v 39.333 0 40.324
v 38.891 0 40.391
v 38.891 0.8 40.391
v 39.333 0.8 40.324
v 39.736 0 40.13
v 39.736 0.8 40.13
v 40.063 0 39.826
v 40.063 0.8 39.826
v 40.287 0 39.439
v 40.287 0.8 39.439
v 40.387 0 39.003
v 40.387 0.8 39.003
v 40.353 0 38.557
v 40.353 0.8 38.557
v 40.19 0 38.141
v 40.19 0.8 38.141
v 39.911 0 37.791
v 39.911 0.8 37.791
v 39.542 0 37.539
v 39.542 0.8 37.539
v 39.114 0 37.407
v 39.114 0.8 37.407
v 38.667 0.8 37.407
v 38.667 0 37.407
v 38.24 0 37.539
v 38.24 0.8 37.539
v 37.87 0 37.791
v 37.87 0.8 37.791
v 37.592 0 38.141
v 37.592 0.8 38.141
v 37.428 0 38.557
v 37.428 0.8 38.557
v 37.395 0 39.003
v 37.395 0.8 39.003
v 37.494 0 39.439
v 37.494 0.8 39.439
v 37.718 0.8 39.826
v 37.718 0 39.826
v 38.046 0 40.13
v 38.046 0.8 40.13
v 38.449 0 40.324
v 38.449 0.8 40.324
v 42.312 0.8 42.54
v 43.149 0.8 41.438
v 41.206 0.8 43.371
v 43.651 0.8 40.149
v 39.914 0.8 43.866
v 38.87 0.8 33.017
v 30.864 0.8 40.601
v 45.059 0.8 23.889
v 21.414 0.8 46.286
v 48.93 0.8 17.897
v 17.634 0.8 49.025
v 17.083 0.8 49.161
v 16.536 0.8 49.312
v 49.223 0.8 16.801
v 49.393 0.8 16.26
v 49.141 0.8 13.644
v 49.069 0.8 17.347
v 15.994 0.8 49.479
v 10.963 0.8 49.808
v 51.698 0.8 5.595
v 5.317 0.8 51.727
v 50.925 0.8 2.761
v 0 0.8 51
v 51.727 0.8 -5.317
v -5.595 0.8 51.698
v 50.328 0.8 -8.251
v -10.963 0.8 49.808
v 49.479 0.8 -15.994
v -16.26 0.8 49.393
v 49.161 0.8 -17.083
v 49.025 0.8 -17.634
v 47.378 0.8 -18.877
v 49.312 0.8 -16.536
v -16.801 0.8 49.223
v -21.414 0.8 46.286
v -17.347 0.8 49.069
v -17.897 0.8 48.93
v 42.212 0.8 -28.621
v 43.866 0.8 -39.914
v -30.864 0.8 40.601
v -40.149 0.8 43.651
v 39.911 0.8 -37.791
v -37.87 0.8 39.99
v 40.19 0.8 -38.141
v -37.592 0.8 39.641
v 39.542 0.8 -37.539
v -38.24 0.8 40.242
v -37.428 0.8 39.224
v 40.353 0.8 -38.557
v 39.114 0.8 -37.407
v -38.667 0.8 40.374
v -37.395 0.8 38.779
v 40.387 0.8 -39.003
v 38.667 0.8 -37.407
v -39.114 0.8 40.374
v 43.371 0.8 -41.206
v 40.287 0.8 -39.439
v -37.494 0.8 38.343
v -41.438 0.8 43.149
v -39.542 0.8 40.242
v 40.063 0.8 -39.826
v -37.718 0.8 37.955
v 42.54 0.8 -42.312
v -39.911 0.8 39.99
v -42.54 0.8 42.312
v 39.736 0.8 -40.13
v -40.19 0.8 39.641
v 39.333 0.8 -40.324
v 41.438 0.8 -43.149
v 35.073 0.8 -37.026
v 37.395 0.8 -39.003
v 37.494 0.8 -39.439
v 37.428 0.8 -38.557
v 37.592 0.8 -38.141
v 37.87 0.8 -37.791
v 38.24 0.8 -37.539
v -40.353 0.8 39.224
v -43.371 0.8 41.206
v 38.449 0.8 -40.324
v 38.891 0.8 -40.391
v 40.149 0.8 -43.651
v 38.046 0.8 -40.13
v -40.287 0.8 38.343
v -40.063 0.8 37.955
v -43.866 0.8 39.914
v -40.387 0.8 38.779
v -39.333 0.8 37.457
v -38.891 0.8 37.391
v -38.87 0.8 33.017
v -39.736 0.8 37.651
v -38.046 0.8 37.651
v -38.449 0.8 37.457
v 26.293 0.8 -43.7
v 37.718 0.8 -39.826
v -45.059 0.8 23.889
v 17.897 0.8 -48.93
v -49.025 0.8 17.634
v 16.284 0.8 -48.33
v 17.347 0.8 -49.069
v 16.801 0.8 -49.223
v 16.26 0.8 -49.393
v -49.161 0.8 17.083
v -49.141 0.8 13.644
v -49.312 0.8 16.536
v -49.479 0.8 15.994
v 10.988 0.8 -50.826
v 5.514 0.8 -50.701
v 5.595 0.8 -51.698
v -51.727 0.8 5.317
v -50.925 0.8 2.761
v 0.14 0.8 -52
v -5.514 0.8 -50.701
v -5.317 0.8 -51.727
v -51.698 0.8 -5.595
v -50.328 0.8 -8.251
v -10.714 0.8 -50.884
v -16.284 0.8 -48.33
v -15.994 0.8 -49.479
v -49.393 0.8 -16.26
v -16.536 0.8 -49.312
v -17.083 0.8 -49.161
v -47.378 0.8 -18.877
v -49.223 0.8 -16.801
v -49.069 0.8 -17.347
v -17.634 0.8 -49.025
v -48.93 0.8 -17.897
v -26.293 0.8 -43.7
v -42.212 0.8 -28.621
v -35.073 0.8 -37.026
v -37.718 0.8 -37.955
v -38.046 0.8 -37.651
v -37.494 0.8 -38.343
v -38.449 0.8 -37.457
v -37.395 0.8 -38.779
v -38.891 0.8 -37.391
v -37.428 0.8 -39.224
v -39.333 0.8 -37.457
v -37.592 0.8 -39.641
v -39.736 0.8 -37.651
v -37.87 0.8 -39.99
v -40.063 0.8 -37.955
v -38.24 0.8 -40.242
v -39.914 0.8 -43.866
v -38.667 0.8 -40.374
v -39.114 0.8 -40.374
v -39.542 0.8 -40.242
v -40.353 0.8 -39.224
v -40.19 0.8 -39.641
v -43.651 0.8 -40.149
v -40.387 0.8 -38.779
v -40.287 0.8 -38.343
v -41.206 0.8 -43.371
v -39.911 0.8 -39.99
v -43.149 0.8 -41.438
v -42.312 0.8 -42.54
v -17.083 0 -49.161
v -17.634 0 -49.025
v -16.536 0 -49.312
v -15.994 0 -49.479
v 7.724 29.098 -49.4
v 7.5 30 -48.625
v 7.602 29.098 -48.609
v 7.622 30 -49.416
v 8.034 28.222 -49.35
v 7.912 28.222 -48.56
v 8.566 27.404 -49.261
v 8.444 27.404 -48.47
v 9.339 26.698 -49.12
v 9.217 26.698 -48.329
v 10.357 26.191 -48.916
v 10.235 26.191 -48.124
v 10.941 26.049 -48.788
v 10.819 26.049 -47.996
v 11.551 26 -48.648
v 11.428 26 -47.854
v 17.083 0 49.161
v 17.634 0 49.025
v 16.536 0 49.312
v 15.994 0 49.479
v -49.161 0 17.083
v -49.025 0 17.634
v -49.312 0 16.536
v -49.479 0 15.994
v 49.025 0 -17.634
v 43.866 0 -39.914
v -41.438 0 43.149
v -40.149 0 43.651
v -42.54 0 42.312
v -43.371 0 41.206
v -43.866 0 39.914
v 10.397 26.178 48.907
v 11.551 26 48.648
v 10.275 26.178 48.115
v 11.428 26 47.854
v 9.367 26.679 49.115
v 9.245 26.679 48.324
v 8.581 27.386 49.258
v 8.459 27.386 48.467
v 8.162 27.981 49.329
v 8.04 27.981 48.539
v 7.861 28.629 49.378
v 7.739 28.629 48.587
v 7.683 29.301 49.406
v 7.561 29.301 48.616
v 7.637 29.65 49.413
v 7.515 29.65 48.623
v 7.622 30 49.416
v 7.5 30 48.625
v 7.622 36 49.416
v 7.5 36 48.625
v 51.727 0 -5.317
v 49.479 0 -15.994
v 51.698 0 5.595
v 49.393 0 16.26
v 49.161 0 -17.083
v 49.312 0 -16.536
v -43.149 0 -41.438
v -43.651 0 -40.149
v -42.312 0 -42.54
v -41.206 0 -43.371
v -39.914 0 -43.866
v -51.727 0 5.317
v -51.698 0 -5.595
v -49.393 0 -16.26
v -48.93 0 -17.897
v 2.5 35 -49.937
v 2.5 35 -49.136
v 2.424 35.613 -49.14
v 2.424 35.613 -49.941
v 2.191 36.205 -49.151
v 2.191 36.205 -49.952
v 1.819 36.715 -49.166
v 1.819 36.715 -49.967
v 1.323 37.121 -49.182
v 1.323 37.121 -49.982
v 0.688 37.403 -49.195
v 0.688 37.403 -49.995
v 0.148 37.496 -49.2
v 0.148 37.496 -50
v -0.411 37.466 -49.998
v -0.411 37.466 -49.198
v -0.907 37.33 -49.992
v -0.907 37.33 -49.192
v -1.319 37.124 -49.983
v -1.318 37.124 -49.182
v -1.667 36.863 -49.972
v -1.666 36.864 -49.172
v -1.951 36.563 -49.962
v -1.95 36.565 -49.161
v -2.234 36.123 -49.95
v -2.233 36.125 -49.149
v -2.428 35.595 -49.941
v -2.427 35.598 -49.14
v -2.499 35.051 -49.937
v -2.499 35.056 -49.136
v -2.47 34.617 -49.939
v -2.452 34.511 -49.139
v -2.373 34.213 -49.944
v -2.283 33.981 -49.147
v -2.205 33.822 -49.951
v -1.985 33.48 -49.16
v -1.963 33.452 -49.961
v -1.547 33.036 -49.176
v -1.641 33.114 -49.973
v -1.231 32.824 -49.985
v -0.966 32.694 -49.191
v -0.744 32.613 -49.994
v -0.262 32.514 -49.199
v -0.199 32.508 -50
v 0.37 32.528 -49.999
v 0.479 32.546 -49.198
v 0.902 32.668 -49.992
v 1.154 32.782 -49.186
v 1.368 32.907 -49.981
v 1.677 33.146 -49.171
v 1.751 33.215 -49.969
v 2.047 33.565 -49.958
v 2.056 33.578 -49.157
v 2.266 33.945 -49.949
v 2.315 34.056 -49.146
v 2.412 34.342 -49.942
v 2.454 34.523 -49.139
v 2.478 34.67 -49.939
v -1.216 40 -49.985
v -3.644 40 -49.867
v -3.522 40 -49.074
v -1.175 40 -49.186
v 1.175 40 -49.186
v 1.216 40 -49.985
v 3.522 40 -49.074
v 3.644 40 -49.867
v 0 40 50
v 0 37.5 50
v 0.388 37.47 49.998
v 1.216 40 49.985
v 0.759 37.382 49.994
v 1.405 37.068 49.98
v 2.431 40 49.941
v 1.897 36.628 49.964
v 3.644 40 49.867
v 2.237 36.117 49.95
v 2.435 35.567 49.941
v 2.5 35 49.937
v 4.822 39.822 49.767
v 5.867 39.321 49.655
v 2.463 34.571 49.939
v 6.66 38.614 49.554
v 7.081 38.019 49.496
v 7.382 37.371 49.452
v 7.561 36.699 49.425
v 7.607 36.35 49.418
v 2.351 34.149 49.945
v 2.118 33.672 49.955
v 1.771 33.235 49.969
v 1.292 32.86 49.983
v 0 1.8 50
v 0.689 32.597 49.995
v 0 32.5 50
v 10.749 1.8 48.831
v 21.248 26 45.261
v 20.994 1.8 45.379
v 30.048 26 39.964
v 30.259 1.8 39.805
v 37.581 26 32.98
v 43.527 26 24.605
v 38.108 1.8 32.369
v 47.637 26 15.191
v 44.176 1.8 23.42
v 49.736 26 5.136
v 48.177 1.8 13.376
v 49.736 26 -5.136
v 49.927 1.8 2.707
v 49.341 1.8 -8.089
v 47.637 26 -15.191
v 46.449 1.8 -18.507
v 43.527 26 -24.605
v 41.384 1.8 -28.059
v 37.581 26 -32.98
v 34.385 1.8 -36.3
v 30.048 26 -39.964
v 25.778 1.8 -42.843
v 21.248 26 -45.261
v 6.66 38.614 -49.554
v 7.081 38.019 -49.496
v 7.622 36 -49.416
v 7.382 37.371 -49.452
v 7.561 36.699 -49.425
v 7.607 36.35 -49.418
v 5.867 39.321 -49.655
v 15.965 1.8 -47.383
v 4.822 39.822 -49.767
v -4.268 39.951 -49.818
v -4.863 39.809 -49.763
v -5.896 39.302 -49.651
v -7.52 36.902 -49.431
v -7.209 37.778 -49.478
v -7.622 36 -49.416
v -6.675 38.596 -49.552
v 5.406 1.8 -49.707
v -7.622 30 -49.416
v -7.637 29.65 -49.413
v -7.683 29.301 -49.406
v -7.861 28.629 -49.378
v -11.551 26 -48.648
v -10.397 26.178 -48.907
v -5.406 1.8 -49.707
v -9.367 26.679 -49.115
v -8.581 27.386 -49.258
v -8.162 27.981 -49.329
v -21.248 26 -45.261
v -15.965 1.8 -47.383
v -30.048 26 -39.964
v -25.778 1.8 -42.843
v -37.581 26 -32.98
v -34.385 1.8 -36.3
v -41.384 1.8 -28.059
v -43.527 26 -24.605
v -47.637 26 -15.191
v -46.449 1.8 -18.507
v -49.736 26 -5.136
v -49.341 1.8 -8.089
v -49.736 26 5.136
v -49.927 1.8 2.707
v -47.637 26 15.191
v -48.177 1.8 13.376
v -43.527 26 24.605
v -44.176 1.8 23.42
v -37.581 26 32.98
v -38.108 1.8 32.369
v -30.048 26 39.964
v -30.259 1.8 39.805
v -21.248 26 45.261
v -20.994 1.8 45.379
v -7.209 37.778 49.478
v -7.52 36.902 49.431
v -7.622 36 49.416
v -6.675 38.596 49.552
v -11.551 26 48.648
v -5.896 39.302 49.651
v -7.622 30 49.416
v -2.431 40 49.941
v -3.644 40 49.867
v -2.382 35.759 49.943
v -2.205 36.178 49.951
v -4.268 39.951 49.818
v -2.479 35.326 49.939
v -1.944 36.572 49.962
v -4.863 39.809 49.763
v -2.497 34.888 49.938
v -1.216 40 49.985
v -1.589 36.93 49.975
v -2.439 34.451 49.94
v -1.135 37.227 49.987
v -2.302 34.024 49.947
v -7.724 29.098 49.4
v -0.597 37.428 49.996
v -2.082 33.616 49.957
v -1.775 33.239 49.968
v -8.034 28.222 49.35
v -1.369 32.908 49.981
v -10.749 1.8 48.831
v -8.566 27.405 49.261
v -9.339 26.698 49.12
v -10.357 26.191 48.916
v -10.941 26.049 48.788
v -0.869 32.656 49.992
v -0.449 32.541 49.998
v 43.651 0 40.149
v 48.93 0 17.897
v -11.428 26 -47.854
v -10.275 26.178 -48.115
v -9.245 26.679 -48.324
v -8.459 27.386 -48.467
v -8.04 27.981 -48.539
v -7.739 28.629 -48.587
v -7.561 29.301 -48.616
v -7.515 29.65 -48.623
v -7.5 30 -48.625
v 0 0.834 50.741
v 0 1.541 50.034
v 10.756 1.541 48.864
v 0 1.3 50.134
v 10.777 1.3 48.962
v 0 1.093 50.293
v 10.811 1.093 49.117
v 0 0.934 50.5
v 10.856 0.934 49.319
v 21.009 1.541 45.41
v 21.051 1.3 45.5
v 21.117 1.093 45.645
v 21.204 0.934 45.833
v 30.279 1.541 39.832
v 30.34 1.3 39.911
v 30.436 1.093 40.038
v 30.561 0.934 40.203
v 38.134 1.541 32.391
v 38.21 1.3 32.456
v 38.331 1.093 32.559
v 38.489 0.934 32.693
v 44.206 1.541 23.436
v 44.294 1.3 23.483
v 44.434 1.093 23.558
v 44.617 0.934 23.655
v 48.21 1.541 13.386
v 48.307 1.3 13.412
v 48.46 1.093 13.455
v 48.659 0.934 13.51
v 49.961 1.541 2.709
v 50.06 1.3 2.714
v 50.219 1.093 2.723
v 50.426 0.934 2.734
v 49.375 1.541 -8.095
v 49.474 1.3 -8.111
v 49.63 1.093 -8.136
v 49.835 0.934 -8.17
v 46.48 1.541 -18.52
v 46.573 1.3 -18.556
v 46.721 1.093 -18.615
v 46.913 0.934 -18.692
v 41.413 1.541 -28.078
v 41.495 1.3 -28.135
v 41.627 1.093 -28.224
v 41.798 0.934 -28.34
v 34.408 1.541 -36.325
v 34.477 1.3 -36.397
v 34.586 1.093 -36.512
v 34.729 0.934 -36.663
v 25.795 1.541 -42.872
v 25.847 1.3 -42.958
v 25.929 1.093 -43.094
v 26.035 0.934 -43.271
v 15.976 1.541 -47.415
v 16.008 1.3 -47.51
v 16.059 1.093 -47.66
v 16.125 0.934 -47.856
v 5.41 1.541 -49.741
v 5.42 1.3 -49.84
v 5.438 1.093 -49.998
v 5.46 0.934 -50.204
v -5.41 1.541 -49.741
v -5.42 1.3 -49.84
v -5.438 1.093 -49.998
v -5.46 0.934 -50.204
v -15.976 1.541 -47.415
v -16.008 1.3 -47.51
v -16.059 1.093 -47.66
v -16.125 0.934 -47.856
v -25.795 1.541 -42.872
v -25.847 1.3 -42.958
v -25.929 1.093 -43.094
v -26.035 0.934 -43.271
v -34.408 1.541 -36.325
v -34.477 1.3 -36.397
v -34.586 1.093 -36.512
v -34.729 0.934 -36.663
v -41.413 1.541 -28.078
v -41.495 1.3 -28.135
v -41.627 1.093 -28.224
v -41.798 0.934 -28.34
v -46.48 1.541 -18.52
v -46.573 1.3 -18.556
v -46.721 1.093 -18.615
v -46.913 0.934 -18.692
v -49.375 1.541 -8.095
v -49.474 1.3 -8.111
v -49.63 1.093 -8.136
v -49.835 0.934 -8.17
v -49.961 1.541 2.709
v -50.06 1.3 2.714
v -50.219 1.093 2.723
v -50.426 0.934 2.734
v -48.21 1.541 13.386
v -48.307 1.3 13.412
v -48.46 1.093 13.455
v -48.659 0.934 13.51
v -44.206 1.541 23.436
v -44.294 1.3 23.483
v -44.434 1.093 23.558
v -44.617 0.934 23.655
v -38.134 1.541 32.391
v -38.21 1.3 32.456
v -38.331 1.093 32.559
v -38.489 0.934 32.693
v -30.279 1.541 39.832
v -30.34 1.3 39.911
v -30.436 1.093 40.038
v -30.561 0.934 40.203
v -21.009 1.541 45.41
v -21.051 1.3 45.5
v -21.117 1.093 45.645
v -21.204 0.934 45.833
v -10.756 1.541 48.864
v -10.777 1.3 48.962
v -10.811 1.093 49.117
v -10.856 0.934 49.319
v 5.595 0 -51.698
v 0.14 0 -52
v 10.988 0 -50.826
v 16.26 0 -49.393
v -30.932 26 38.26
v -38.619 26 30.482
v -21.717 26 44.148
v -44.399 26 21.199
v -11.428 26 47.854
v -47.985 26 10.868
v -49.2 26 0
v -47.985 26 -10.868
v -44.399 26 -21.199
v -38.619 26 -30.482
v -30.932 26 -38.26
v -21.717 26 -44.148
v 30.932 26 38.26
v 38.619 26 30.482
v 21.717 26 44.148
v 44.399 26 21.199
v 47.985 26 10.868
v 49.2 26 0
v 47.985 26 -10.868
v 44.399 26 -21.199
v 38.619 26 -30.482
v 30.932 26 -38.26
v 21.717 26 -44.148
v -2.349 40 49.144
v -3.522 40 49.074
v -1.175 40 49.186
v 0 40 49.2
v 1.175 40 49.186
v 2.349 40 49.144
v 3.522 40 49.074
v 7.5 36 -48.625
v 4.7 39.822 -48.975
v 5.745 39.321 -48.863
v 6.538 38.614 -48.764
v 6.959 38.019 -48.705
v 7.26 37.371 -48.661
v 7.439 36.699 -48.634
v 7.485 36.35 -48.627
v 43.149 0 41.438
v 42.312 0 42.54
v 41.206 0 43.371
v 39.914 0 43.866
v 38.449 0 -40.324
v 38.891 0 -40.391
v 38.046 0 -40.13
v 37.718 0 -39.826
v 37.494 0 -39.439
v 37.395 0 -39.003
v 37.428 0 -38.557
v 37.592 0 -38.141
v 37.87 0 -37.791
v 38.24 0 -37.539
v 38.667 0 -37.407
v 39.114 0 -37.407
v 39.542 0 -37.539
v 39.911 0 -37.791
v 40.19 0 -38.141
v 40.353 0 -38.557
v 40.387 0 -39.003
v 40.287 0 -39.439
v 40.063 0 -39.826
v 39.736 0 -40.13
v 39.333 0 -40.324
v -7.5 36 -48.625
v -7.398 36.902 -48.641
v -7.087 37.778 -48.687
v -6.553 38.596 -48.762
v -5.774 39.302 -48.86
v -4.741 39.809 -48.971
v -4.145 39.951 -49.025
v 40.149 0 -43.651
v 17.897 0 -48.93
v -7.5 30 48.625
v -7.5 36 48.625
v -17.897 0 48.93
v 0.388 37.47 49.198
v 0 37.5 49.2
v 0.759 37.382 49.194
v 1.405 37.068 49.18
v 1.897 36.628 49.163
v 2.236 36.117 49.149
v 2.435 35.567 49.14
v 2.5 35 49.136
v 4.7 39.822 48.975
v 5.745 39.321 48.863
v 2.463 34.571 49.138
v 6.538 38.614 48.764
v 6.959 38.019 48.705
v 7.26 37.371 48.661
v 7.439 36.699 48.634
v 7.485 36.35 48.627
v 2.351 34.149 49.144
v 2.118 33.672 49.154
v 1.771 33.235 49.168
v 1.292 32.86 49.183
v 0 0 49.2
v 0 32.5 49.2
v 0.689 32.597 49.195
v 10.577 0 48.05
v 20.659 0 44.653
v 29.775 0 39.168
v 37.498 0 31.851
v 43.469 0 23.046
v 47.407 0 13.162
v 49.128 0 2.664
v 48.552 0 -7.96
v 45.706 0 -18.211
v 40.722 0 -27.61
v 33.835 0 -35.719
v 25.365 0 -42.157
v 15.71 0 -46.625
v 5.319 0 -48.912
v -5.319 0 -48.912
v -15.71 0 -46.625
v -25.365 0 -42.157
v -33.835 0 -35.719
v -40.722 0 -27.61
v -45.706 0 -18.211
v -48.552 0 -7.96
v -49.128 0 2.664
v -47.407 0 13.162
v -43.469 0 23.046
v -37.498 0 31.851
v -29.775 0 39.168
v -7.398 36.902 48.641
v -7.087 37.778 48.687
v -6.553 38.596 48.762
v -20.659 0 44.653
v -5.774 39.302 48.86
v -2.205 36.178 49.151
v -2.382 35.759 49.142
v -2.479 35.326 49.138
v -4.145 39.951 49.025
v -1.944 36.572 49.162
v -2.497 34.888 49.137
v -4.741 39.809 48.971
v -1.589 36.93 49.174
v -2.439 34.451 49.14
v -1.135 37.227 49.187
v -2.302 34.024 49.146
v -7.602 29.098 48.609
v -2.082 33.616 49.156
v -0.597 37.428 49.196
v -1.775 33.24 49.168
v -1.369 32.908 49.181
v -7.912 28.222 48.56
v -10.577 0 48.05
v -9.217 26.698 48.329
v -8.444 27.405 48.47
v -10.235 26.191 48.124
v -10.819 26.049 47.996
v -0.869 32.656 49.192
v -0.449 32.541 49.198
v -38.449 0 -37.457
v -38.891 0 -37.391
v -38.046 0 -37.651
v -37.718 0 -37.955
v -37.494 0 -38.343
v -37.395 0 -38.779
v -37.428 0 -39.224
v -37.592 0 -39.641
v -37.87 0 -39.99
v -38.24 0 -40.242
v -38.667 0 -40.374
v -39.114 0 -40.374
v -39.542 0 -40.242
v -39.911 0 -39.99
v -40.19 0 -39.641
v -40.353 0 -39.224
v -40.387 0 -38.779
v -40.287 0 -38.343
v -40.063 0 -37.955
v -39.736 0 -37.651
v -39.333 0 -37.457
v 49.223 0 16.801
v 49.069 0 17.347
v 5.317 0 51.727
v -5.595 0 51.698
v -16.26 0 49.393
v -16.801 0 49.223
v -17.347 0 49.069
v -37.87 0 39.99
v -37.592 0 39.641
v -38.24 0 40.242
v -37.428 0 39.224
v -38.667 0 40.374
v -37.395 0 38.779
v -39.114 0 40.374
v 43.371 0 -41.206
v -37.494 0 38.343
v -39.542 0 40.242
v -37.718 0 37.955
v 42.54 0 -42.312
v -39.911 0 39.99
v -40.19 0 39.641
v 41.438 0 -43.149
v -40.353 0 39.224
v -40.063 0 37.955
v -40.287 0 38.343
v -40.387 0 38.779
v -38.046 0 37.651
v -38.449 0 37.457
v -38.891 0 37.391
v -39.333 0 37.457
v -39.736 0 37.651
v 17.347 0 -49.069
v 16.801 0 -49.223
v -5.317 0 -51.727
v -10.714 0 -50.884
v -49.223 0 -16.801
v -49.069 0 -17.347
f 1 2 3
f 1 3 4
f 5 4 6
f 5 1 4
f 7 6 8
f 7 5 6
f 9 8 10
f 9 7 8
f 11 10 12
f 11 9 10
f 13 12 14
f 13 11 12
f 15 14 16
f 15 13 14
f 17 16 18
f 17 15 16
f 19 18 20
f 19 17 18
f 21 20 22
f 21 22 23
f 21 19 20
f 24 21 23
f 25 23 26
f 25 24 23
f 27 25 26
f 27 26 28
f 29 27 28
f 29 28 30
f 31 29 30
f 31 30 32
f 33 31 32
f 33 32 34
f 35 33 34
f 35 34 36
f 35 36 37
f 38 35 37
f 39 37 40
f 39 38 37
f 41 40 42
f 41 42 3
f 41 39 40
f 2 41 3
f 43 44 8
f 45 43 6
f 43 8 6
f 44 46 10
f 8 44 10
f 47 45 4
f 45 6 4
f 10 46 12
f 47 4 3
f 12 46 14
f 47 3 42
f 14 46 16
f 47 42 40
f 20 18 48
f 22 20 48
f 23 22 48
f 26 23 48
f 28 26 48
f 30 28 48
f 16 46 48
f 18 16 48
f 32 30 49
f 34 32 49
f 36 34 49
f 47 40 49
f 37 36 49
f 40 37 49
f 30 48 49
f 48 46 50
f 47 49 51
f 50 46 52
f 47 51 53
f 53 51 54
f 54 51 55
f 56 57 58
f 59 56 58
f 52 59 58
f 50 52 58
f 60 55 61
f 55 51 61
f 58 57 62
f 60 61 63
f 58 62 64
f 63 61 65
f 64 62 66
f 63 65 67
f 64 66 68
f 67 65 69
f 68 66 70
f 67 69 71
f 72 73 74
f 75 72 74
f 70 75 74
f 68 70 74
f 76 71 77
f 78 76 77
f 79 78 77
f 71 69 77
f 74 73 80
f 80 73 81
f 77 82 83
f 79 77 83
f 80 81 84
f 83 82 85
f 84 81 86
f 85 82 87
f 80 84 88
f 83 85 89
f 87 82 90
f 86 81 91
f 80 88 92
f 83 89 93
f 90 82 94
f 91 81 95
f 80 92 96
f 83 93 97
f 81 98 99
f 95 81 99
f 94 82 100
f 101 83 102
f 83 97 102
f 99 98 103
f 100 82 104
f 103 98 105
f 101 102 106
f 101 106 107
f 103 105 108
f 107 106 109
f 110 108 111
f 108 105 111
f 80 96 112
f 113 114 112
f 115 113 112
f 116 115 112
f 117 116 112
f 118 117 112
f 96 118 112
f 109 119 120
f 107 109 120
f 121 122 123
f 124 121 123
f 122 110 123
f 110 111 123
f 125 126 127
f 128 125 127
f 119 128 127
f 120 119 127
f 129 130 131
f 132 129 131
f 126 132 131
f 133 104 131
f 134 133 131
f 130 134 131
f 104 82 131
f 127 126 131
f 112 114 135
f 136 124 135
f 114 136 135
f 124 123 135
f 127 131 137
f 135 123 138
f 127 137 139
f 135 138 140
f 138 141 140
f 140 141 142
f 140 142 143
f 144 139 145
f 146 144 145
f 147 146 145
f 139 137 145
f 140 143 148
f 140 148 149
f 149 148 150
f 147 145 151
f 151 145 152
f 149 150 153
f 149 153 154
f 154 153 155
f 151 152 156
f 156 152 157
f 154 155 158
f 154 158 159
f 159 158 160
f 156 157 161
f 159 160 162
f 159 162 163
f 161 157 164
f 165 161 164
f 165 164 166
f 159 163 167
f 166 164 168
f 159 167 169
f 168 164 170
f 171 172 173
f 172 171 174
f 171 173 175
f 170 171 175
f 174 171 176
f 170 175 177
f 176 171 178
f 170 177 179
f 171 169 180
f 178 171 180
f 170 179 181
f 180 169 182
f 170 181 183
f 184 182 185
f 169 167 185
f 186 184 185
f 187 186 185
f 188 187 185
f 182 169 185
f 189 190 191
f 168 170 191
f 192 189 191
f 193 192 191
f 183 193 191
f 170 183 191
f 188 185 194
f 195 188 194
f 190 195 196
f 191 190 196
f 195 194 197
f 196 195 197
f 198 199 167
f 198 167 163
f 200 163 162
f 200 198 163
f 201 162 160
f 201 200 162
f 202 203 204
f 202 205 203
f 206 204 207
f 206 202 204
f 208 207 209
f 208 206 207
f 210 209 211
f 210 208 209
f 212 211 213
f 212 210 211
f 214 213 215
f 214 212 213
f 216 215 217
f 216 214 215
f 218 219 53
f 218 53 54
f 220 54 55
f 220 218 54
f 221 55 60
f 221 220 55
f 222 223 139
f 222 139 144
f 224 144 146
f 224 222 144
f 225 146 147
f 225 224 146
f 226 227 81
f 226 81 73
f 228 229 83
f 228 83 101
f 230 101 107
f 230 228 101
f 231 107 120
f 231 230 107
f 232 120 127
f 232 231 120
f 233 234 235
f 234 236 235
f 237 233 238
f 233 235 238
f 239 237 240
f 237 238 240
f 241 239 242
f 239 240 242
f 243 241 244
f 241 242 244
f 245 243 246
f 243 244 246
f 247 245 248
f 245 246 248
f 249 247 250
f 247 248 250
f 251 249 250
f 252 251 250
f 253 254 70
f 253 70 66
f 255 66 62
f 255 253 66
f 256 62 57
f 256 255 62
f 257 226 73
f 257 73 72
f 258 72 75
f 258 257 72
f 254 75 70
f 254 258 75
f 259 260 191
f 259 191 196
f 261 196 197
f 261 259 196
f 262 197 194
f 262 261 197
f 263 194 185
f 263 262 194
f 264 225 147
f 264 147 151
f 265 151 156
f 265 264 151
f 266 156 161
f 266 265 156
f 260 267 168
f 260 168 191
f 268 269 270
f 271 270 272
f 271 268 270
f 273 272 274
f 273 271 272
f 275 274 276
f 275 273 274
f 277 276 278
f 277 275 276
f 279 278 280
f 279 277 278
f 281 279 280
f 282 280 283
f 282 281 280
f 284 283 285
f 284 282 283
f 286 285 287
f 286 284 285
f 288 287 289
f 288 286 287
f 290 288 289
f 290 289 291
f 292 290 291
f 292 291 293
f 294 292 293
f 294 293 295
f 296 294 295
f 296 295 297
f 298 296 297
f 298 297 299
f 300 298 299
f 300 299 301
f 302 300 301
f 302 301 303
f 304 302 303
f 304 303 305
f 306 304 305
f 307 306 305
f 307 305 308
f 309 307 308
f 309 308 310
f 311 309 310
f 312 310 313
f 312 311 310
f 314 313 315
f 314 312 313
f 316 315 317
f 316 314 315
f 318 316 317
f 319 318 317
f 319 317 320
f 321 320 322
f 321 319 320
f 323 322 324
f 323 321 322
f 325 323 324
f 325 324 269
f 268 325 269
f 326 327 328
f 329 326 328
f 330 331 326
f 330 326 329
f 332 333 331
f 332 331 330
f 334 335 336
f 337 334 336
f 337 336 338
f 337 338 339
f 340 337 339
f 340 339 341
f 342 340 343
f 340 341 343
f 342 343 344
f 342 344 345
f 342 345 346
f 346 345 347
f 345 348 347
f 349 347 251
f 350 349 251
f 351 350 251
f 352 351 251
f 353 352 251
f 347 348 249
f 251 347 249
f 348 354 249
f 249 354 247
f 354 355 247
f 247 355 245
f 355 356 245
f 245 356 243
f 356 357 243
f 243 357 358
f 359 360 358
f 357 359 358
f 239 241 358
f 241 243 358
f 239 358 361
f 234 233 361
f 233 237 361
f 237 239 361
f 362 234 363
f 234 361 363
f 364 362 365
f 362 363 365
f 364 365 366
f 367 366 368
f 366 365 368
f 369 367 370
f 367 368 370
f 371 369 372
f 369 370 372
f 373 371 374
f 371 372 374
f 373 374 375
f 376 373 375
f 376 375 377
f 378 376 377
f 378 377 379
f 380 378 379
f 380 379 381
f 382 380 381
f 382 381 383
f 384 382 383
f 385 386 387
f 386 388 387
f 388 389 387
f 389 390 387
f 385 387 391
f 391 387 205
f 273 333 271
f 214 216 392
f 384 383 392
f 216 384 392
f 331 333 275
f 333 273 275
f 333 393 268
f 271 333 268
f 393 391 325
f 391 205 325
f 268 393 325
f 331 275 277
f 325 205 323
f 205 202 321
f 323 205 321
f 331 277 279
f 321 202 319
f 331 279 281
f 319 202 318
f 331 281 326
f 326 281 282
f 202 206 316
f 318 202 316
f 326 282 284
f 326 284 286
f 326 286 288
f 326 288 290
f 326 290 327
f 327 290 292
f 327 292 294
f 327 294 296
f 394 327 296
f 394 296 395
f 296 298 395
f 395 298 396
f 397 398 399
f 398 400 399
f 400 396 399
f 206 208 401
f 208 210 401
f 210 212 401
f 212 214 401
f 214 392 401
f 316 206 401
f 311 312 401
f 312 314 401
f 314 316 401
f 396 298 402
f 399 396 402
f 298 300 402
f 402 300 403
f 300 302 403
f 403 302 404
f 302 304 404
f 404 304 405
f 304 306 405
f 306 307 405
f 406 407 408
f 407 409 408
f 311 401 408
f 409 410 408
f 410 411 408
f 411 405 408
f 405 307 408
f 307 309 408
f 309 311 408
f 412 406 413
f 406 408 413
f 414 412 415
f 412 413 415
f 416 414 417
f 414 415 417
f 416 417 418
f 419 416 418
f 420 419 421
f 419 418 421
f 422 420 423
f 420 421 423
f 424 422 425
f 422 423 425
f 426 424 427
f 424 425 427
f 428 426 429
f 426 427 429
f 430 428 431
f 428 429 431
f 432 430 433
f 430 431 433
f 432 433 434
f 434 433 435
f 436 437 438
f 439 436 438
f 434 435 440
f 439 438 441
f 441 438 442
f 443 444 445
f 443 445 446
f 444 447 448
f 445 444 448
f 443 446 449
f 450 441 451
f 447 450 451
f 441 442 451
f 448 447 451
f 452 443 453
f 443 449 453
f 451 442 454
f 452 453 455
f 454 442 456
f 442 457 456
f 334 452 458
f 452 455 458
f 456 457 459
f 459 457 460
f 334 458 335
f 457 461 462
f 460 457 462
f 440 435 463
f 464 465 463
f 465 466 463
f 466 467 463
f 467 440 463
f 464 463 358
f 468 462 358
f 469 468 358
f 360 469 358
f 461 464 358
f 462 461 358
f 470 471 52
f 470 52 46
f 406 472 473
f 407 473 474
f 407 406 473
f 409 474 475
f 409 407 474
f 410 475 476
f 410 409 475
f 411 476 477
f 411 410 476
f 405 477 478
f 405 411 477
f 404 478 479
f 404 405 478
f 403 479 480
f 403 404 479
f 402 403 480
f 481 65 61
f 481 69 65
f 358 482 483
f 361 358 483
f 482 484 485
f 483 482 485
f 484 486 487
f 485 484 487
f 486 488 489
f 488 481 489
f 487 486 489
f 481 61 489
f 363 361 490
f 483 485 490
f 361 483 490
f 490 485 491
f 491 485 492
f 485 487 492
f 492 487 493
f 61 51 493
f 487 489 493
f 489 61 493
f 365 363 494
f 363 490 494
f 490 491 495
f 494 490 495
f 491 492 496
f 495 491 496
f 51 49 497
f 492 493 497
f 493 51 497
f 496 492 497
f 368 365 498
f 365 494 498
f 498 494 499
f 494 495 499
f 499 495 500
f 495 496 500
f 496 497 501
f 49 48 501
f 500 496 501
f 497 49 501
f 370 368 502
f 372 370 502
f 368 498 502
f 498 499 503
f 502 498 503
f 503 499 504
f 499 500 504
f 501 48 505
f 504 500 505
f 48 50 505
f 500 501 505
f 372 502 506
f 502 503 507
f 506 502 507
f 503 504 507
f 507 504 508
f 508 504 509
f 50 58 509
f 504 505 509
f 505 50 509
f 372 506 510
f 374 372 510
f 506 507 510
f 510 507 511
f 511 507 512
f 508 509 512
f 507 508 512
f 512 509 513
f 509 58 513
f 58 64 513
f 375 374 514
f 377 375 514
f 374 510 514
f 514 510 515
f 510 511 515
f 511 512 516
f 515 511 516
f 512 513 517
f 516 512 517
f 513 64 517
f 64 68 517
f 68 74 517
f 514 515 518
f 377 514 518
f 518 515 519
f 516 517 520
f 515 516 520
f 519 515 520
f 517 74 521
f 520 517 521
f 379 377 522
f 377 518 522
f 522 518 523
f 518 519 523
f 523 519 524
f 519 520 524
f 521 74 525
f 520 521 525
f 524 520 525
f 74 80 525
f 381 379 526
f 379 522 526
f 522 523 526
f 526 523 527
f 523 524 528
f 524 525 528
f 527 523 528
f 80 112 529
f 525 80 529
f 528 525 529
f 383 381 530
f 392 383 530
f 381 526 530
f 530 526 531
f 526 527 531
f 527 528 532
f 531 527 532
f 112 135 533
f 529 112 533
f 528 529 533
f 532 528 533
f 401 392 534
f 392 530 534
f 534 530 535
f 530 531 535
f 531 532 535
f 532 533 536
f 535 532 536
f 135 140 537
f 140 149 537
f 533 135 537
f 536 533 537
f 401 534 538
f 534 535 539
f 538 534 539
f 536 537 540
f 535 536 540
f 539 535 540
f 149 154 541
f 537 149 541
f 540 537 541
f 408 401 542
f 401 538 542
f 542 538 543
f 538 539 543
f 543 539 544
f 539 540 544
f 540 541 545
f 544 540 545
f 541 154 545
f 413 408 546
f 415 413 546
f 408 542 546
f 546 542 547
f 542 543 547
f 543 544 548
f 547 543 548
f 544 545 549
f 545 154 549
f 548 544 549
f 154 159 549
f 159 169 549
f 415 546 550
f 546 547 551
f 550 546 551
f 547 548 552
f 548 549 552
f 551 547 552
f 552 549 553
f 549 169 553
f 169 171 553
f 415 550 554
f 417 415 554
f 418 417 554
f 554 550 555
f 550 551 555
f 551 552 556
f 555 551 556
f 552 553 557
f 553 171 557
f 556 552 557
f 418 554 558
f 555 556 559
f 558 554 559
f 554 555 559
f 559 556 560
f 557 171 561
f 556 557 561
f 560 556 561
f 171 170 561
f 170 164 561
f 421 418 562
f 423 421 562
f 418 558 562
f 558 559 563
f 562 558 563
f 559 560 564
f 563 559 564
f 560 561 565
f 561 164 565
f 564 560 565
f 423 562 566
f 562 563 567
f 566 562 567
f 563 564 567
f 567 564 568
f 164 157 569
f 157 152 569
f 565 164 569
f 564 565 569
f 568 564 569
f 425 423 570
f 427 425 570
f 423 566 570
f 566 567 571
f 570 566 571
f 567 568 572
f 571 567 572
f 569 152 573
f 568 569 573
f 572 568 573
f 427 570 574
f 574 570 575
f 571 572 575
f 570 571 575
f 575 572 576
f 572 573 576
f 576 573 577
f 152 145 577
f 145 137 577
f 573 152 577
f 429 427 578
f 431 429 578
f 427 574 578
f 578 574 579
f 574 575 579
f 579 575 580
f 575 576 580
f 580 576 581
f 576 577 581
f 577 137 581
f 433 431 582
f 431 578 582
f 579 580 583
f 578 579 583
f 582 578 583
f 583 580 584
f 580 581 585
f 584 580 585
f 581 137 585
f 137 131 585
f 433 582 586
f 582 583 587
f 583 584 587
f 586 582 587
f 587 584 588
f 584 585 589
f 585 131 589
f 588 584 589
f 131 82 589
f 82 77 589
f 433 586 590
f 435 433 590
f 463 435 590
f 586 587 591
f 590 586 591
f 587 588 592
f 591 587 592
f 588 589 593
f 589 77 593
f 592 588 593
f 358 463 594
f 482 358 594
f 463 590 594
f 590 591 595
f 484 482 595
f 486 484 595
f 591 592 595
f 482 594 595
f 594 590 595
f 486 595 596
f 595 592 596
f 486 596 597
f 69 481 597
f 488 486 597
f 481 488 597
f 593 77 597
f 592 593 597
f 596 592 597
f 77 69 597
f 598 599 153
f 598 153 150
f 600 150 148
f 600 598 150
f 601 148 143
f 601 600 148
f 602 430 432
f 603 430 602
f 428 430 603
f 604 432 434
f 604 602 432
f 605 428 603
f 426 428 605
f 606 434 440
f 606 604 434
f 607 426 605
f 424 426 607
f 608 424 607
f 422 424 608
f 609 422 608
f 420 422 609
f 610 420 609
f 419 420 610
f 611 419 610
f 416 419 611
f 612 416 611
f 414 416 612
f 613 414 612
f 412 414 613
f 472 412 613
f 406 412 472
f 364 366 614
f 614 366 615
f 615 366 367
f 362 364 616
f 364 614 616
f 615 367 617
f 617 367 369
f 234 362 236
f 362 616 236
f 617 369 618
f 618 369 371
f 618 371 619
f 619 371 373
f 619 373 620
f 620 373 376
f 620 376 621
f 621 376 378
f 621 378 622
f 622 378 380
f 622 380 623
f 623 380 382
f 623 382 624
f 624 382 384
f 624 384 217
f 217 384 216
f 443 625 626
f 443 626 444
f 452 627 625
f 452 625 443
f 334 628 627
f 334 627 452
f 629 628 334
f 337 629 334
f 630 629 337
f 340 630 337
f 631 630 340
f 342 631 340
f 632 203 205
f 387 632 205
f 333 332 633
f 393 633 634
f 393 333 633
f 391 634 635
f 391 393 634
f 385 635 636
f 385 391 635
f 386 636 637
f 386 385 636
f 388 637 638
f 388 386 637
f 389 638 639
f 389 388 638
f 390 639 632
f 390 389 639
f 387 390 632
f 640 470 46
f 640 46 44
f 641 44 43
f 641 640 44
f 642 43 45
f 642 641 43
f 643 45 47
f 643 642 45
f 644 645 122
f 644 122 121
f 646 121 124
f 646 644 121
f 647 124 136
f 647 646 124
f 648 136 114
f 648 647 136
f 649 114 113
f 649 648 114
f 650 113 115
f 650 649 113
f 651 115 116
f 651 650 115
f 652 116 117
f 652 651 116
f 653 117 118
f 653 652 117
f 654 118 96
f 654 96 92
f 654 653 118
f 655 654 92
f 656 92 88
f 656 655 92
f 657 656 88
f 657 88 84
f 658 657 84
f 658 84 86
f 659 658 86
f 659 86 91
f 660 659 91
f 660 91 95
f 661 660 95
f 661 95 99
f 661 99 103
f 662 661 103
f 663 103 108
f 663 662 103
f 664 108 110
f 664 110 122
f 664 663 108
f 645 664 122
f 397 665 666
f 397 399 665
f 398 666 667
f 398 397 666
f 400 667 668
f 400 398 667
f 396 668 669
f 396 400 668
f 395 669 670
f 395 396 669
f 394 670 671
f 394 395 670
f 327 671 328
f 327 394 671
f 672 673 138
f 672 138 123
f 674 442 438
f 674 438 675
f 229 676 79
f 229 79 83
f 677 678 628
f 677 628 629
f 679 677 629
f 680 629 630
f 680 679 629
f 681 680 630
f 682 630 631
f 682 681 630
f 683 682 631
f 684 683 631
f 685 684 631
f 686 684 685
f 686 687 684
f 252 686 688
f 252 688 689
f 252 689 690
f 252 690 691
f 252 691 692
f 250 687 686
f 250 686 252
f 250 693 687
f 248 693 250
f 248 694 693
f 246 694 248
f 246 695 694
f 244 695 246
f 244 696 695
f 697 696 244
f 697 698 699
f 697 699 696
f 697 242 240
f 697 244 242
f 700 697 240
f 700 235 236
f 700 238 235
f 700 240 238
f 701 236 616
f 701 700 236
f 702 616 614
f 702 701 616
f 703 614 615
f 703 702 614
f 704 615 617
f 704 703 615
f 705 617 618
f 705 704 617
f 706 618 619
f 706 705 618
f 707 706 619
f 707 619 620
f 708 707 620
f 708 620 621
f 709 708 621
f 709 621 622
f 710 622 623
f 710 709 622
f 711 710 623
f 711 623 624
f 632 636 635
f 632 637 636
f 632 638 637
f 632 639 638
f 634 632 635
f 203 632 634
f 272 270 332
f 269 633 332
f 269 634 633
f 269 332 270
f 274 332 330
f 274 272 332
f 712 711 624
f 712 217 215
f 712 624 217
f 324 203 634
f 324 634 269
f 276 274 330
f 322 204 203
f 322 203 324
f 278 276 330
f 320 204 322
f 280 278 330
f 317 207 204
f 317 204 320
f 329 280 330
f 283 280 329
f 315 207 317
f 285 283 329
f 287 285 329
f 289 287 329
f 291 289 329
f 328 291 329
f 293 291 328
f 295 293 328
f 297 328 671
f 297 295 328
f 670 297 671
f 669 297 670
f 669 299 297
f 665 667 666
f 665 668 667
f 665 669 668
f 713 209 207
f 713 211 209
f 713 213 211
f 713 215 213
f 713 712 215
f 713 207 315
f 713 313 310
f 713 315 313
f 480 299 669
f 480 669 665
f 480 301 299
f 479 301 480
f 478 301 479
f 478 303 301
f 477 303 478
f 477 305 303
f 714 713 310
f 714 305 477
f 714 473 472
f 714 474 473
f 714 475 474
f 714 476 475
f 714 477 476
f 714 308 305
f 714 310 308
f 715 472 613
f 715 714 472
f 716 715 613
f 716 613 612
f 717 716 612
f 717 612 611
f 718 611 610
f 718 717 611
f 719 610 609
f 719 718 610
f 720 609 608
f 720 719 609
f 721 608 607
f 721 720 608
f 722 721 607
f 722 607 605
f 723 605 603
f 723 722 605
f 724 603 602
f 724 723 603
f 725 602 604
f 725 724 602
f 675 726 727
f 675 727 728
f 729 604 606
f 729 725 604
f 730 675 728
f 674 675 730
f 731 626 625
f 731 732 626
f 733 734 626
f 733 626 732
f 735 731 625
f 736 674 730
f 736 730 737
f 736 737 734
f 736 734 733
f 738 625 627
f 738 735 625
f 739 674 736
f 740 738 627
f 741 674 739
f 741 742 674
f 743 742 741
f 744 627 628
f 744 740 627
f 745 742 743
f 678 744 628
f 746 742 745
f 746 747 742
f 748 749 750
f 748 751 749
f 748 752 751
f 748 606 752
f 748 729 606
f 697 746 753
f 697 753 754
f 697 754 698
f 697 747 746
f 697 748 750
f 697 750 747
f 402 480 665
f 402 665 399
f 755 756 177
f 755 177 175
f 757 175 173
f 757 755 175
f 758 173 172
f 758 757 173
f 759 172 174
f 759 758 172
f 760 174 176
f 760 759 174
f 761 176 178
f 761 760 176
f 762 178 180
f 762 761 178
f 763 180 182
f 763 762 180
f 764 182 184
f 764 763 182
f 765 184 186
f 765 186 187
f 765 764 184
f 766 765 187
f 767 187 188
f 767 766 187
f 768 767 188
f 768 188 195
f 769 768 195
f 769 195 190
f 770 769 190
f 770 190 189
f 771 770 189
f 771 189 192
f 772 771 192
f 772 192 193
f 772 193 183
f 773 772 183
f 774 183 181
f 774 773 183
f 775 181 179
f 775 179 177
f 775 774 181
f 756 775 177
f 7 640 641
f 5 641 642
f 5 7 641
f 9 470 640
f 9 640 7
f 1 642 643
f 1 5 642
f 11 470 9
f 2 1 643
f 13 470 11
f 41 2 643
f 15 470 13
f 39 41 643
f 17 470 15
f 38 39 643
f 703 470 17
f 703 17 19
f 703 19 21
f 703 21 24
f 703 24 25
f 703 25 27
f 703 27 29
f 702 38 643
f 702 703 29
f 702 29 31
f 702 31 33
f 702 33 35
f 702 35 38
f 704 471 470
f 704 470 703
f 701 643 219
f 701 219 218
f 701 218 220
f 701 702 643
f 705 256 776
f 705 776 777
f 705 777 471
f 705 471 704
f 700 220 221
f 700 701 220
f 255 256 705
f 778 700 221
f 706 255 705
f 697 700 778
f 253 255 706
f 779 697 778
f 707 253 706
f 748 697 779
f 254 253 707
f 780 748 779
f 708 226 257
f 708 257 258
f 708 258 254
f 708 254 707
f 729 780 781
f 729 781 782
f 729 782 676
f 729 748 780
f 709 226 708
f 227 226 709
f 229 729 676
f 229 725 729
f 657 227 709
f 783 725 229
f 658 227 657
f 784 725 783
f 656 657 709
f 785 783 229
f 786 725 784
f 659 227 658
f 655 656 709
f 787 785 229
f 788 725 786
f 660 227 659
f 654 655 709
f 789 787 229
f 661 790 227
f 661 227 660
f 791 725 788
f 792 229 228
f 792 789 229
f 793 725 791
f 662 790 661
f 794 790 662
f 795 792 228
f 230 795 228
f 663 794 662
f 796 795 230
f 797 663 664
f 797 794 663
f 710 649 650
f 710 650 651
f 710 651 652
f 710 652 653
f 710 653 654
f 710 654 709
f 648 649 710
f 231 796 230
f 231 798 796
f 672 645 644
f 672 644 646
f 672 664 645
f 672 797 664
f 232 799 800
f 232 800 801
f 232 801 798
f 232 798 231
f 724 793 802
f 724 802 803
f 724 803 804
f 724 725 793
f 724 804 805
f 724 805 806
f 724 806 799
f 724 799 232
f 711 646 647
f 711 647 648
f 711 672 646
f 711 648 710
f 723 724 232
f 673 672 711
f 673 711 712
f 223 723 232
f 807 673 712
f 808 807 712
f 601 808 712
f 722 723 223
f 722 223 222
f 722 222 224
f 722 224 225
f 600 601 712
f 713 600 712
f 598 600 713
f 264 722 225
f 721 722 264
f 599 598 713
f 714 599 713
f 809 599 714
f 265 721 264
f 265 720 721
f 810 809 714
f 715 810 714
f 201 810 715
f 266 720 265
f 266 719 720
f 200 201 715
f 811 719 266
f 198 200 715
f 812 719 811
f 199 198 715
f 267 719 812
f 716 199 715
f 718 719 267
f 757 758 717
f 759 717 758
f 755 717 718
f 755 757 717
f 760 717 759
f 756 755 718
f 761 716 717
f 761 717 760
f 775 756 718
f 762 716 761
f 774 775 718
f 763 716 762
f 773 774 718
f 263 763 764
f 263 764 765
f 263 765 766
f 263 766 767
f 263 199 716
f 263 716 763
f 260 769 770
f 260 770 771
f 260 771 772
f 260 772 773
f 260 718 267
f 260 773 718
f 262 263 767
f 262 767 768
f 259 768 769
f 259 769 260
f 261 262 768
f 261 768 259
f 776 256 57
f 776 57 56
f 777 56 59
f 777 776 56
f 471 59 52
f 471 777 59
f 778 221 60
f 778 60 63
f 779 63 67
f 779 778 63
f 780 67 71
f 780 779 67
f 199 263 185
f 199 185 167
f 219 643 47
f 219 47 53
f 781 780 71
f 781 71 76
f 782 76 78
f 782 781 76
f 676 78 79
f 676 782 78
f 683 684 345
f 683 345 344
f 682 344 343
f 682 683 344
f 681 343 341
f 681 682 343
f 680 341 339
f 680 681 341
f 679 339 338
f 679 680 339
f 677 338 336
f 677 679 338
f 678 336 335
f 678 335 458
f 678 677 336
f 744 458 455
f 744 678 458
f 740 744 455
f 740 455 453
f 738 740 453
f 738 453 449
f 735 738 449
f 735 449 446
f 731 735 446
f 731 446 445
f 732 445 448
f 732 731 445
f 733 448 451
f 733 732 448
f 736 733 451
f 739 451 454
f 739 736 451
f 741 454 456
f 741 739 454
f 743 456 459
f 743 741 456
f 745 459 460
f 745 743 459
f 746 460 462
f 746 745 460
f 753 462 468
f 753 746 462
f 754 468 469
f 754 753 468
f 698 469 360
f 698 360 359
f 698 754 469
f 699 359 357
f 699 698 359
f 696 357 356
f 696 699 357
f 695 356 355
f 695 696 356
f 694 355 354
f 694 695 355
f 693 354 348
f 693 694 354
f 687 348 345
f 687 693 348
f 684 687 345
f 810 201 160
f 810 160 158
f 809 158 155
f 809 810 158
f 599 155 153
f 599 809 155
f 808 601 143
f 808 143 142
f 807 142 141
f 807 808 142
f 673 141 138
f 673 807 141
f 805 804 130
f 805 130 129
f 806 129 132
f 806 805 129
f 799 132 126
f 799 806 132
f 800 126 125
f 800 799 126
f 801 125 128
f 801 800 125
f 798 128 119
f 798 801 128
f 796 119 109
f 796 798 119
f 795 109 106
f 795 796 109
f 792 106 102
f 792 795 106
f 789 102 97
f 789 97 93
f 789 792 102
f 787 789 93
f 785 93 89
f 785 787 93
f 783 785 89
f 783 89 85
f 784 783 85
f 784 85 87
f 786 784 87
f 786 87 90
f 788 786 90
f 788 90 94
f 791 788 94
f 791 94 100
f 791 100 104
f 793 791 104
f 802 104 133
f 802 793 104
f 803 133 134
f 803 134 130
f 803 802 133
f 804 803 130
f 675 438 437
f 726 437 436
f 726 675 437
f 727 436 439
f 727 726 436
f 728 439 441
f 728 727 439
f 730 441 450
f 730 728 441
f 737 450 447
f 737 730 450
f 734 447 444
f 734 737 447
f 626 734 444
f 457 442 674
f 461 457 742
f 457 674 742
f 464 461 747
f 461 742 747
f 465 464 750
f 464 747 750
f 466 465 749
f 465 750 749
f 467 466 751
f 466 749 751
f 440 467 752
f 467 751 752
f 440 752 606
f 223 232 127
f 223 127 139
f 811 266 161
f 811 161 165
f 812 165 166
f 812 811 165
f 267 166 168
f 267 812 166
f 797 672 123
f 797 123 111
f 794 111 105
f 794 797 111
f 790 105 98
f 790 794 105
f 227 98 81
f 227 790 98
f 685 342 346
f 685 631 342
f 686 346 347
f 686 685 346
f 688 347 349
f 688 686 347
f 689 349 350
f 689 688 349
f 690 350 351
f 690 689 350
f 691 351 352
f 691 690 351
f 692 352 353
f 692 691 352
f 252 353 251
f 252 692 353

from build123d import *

# Parameters (mm, degrees)
SKETCH1_R               = 50
SKETCH1_R_2             = 1.5
BOSS_EXTRUDE1_DEPTH     = 0.8
SKETCH1_4_R             = 50
SKETCH1_4_R_2           = 49.2
BOSS_EXTRUDE3_DEPTH     = 40
FILLET1_R               = 1
CUT_EXTRUDE1_START      = -14
CUT_EXTRUDE1_DEPTH      = 14
CUT_EXTRUDE2_START      = -14
CUT_EXTRUDE2_DEPTH      = 14
FILLET2_R               = 4
FILLET4_R               = 4
CUT_EXTRUDE3_DEPTH      = 84.713798194
CUT_EXTRUDE3_DEPTH_BACK = 84.713798194
SKETCH16_R              = 2.5


with BuildPart() as part:
    # Sketch1 → Boss-Extrude1 (new body)
    with BuildSketch(Plane(origin=(0, 0, 0), x_dir=(1, 0, 0), z_dir=(0, 1, 0))):
        with BuildLine():
            Line((17.897079586, 48.929734976), (40.149284407, 43.651218265))
            ThreePointArc((40.149284407, 43.651218265), (42.540265174, 42.312242187), (43.866371506, 39.91409958))
            Line((43.866371506, 39.91409958), (49.02521675, 17.633846579))
            ThreePointArc((49.02521675, 17.633846579), (49.23478351, 16.809026698), (49.479249782, 15.993868858))
            ThreePointArc((49.479249782, 15.993868858), (51.999812242, -0.139738387), (49.392575566, -16.259565766))
            ThreePointArc((49.392575566, -16.259565766), (49.143731732, -17.073397941), (48.929734976, -17.897079586))
            Line((48.929734976, -17.897079586), (43.651218265, -40.149284407))
            ThreePointArc((43.651218265, -40.149284407), (42.312242187, -42.540265174), (39.91409958, -43.866371506))
            Line((39.91409958, -43.866371506), (17.633846579, -49.02521675))
            ThreePointArc((17.633846579, -49.02521675), (16.809026698, -49.23478351), (15.993868858, -49.479249782))
            ThreePointArc((15.993868858, -49.479249782), (-0.139738387, -51.999812242), (-16.259565766, -49.392575566))
            ThreePointArc((-16.259565766, -49.392575566), (-17.073397941, -49.143731732), (-17.897079586, -48.929734976))
            Line((-17.897079586, -48.929734976), (-40.149284407, -43.651218265))
            ThreePointArc((-40.149284407, -43.651218265), (-42.540265174, -42.312242187), (-43.866371506, -39.91409958))
            Line((-43.866371506, -39.91409958), (-49.02521675, -17.633846579))
            ThreePointArc((-49.02521675, -17.633846579), (-49.23478351, -16.809026698), (-49.479249782, -15.993868858))
            ThreePointArc((-49.479249782, -15.993868858), (-51.999812242, 0.139738387), (-49.392575566, 16.259565766))
            ThreePointArc((-49.392575566, 16.259565766), (-49.143731732, 17.073397941), (-48.929734976, 17.897079586))
            Line((-48.929734976, 17.897079586), (-43.651218265, 40.149284407))
            ThreePointArc((-43.651218265, 40.149284407), (-42.312242187, 42.540265174), (-39.91409958, 43.866371506))
            Line((-39.91409958, 43.866371506), (-17.633846579, 49.02521675))
            ThreePointArc((-17.633846579, 49.02521675), (-16.809026698, 49.23478351), (-15.993868858, 49.479249782))
            ThreePointArc((-15.993868858, 49.479249782), (-8.026622704, 51.3767781), (0.139738387, 51.999812242))
            ThreePointArc((0.139738387, 51.999812242), (8.302633013, 51.332896714), (16.259565766, 49.392575566))
            ThreePointArc((16.259565766, 49.392575566), (17.073397941, 49.143731732), (17.897079586, 48.929734976))
        make_face()
        Circle(SKETCH1_R, mode=Mode.SUBTRACT)
        with Locations((-38.8907, 38.8907)):
            Circle(SKETCH1_R_2, mode=Mode.SUBTRACT)
        with Locations((38.8907, 38.8907)):
            Circle(SKETCH1_R_2, mode=Mode.SUBTRACT)
        with Locations((38.8907, -38.8907)):
            Circle(SKETCH1_R_2, mode=Mode.SUBTRACT)
        with Locations((-38.8907, -38.8907)):
            Circle(SKETCH1_R_2, mode=Mode.SUBTRACT)
    extrude(amount=BOSS_EXTRUDE1_DEPTH)

    # Sketch1<4> → Boss-Extrude3 (add)
    with BuildSketch(Plane(origin=(0, 0, 0), x_dir=(1, 0, 0), z_dir=(0, 1, 0))):
        Circle(SKETCH1_4_R)
        Circle(SKETCH1_4_R_2, mode=Mode.SUBTRACT)
    extrude(amount=BOSS_EXTRUDE3_DEPTH)

    # Fillet1
    fillet1_edges = [part.edges().sort_by_distance(p)[0] for p in [
        (-50, 0.8, 0),
    ]]
    fillet(fillet1_edges, radius=FILLET1_R)

    # Sketch10 → Cut-Extrude1 (cut)
    with BuildSketch(Plane(origin=(0, 40, 0), x_dir=(1, 0, 0), z_dir=(0, 1, 0)).offset(CUT_EXTRUDE1_START)):
        with BuildLine():
            Line((0, 0), (-7.621909697, 49.41565028))
            ThreePointArc((-7.621909697, 49.41565028), (-50, 0), (-7.621909697, -49.41565028))
            Line((-7.621909697, -49.41565028), (0, 0))
        make_face()
    extrude(amount=CUT_EXTRUDE1_DEPTH, mode=Mode.SUBTRACT)

    # Sketch11 → Cut-Extrude2 (cut)
    with BuildSketch(Plane(origin=(0, 40, 0), x_dir=(1, 0, 0), z_dir=(0, 1, 0)).offset(CUT_EXTRUDE2_START)):
        with BuildLine():
            Line((0, 0), (7.621909697, 49.41565028))
            ThreePointArc((7.621909697, 49.41565028), (50, 0), (7.621909697, -49.41565028))
            Line((7.621909697, -49.41565028), (0, 0))
        make_face()
    extrude(amount=CUT_EXTRUDE2_DEPTH, mode=Mode.SUBTRACT)

    # Fillet2
    fillet2_edges = [part.edges().sort_by_distance(p)[0] for p in [
        (-7.560934419, 26, -49.020325078),
        (7.560934419, 26, -49.020325078),
        (7.560934419, 26, 49.020325078),
        (-7.560934419, 26, 49.020325078),
    ]]
    fillet(fillet2_edges, radius=FILLET2_R)

    # Fillet4
    fillet4_edges = [part.edges().sort_by_distance(p)[0] for p in [
        (7.560934419, 40, -49.020325078),
        (-7.560934419, 40, -49.020325078),
        (7.560934419, 40, 49.020325078),
        (-7.560934419, 40, 49.020325078),
    ]]
    fillet(fillet4_edges, radius=FILLET4_R)

    # Sketch16 → Cut-Extrude3 (cut, two sides: drawn at the far end of the back side and taken through both)
    with BuildSketch(Plane.XY.offset(-CUT_EXTRUDE3_DEPTH_BACK)):
        with Locations((0, 35)):
            Circle(SKETCH16_R)
    extrude(amount=CUT_EXTRUDE3_DEPTH + CUT_EXTRUDE3_DEPTH_BACK, mode=Mode.SUBTRACT)


solid = part.part
